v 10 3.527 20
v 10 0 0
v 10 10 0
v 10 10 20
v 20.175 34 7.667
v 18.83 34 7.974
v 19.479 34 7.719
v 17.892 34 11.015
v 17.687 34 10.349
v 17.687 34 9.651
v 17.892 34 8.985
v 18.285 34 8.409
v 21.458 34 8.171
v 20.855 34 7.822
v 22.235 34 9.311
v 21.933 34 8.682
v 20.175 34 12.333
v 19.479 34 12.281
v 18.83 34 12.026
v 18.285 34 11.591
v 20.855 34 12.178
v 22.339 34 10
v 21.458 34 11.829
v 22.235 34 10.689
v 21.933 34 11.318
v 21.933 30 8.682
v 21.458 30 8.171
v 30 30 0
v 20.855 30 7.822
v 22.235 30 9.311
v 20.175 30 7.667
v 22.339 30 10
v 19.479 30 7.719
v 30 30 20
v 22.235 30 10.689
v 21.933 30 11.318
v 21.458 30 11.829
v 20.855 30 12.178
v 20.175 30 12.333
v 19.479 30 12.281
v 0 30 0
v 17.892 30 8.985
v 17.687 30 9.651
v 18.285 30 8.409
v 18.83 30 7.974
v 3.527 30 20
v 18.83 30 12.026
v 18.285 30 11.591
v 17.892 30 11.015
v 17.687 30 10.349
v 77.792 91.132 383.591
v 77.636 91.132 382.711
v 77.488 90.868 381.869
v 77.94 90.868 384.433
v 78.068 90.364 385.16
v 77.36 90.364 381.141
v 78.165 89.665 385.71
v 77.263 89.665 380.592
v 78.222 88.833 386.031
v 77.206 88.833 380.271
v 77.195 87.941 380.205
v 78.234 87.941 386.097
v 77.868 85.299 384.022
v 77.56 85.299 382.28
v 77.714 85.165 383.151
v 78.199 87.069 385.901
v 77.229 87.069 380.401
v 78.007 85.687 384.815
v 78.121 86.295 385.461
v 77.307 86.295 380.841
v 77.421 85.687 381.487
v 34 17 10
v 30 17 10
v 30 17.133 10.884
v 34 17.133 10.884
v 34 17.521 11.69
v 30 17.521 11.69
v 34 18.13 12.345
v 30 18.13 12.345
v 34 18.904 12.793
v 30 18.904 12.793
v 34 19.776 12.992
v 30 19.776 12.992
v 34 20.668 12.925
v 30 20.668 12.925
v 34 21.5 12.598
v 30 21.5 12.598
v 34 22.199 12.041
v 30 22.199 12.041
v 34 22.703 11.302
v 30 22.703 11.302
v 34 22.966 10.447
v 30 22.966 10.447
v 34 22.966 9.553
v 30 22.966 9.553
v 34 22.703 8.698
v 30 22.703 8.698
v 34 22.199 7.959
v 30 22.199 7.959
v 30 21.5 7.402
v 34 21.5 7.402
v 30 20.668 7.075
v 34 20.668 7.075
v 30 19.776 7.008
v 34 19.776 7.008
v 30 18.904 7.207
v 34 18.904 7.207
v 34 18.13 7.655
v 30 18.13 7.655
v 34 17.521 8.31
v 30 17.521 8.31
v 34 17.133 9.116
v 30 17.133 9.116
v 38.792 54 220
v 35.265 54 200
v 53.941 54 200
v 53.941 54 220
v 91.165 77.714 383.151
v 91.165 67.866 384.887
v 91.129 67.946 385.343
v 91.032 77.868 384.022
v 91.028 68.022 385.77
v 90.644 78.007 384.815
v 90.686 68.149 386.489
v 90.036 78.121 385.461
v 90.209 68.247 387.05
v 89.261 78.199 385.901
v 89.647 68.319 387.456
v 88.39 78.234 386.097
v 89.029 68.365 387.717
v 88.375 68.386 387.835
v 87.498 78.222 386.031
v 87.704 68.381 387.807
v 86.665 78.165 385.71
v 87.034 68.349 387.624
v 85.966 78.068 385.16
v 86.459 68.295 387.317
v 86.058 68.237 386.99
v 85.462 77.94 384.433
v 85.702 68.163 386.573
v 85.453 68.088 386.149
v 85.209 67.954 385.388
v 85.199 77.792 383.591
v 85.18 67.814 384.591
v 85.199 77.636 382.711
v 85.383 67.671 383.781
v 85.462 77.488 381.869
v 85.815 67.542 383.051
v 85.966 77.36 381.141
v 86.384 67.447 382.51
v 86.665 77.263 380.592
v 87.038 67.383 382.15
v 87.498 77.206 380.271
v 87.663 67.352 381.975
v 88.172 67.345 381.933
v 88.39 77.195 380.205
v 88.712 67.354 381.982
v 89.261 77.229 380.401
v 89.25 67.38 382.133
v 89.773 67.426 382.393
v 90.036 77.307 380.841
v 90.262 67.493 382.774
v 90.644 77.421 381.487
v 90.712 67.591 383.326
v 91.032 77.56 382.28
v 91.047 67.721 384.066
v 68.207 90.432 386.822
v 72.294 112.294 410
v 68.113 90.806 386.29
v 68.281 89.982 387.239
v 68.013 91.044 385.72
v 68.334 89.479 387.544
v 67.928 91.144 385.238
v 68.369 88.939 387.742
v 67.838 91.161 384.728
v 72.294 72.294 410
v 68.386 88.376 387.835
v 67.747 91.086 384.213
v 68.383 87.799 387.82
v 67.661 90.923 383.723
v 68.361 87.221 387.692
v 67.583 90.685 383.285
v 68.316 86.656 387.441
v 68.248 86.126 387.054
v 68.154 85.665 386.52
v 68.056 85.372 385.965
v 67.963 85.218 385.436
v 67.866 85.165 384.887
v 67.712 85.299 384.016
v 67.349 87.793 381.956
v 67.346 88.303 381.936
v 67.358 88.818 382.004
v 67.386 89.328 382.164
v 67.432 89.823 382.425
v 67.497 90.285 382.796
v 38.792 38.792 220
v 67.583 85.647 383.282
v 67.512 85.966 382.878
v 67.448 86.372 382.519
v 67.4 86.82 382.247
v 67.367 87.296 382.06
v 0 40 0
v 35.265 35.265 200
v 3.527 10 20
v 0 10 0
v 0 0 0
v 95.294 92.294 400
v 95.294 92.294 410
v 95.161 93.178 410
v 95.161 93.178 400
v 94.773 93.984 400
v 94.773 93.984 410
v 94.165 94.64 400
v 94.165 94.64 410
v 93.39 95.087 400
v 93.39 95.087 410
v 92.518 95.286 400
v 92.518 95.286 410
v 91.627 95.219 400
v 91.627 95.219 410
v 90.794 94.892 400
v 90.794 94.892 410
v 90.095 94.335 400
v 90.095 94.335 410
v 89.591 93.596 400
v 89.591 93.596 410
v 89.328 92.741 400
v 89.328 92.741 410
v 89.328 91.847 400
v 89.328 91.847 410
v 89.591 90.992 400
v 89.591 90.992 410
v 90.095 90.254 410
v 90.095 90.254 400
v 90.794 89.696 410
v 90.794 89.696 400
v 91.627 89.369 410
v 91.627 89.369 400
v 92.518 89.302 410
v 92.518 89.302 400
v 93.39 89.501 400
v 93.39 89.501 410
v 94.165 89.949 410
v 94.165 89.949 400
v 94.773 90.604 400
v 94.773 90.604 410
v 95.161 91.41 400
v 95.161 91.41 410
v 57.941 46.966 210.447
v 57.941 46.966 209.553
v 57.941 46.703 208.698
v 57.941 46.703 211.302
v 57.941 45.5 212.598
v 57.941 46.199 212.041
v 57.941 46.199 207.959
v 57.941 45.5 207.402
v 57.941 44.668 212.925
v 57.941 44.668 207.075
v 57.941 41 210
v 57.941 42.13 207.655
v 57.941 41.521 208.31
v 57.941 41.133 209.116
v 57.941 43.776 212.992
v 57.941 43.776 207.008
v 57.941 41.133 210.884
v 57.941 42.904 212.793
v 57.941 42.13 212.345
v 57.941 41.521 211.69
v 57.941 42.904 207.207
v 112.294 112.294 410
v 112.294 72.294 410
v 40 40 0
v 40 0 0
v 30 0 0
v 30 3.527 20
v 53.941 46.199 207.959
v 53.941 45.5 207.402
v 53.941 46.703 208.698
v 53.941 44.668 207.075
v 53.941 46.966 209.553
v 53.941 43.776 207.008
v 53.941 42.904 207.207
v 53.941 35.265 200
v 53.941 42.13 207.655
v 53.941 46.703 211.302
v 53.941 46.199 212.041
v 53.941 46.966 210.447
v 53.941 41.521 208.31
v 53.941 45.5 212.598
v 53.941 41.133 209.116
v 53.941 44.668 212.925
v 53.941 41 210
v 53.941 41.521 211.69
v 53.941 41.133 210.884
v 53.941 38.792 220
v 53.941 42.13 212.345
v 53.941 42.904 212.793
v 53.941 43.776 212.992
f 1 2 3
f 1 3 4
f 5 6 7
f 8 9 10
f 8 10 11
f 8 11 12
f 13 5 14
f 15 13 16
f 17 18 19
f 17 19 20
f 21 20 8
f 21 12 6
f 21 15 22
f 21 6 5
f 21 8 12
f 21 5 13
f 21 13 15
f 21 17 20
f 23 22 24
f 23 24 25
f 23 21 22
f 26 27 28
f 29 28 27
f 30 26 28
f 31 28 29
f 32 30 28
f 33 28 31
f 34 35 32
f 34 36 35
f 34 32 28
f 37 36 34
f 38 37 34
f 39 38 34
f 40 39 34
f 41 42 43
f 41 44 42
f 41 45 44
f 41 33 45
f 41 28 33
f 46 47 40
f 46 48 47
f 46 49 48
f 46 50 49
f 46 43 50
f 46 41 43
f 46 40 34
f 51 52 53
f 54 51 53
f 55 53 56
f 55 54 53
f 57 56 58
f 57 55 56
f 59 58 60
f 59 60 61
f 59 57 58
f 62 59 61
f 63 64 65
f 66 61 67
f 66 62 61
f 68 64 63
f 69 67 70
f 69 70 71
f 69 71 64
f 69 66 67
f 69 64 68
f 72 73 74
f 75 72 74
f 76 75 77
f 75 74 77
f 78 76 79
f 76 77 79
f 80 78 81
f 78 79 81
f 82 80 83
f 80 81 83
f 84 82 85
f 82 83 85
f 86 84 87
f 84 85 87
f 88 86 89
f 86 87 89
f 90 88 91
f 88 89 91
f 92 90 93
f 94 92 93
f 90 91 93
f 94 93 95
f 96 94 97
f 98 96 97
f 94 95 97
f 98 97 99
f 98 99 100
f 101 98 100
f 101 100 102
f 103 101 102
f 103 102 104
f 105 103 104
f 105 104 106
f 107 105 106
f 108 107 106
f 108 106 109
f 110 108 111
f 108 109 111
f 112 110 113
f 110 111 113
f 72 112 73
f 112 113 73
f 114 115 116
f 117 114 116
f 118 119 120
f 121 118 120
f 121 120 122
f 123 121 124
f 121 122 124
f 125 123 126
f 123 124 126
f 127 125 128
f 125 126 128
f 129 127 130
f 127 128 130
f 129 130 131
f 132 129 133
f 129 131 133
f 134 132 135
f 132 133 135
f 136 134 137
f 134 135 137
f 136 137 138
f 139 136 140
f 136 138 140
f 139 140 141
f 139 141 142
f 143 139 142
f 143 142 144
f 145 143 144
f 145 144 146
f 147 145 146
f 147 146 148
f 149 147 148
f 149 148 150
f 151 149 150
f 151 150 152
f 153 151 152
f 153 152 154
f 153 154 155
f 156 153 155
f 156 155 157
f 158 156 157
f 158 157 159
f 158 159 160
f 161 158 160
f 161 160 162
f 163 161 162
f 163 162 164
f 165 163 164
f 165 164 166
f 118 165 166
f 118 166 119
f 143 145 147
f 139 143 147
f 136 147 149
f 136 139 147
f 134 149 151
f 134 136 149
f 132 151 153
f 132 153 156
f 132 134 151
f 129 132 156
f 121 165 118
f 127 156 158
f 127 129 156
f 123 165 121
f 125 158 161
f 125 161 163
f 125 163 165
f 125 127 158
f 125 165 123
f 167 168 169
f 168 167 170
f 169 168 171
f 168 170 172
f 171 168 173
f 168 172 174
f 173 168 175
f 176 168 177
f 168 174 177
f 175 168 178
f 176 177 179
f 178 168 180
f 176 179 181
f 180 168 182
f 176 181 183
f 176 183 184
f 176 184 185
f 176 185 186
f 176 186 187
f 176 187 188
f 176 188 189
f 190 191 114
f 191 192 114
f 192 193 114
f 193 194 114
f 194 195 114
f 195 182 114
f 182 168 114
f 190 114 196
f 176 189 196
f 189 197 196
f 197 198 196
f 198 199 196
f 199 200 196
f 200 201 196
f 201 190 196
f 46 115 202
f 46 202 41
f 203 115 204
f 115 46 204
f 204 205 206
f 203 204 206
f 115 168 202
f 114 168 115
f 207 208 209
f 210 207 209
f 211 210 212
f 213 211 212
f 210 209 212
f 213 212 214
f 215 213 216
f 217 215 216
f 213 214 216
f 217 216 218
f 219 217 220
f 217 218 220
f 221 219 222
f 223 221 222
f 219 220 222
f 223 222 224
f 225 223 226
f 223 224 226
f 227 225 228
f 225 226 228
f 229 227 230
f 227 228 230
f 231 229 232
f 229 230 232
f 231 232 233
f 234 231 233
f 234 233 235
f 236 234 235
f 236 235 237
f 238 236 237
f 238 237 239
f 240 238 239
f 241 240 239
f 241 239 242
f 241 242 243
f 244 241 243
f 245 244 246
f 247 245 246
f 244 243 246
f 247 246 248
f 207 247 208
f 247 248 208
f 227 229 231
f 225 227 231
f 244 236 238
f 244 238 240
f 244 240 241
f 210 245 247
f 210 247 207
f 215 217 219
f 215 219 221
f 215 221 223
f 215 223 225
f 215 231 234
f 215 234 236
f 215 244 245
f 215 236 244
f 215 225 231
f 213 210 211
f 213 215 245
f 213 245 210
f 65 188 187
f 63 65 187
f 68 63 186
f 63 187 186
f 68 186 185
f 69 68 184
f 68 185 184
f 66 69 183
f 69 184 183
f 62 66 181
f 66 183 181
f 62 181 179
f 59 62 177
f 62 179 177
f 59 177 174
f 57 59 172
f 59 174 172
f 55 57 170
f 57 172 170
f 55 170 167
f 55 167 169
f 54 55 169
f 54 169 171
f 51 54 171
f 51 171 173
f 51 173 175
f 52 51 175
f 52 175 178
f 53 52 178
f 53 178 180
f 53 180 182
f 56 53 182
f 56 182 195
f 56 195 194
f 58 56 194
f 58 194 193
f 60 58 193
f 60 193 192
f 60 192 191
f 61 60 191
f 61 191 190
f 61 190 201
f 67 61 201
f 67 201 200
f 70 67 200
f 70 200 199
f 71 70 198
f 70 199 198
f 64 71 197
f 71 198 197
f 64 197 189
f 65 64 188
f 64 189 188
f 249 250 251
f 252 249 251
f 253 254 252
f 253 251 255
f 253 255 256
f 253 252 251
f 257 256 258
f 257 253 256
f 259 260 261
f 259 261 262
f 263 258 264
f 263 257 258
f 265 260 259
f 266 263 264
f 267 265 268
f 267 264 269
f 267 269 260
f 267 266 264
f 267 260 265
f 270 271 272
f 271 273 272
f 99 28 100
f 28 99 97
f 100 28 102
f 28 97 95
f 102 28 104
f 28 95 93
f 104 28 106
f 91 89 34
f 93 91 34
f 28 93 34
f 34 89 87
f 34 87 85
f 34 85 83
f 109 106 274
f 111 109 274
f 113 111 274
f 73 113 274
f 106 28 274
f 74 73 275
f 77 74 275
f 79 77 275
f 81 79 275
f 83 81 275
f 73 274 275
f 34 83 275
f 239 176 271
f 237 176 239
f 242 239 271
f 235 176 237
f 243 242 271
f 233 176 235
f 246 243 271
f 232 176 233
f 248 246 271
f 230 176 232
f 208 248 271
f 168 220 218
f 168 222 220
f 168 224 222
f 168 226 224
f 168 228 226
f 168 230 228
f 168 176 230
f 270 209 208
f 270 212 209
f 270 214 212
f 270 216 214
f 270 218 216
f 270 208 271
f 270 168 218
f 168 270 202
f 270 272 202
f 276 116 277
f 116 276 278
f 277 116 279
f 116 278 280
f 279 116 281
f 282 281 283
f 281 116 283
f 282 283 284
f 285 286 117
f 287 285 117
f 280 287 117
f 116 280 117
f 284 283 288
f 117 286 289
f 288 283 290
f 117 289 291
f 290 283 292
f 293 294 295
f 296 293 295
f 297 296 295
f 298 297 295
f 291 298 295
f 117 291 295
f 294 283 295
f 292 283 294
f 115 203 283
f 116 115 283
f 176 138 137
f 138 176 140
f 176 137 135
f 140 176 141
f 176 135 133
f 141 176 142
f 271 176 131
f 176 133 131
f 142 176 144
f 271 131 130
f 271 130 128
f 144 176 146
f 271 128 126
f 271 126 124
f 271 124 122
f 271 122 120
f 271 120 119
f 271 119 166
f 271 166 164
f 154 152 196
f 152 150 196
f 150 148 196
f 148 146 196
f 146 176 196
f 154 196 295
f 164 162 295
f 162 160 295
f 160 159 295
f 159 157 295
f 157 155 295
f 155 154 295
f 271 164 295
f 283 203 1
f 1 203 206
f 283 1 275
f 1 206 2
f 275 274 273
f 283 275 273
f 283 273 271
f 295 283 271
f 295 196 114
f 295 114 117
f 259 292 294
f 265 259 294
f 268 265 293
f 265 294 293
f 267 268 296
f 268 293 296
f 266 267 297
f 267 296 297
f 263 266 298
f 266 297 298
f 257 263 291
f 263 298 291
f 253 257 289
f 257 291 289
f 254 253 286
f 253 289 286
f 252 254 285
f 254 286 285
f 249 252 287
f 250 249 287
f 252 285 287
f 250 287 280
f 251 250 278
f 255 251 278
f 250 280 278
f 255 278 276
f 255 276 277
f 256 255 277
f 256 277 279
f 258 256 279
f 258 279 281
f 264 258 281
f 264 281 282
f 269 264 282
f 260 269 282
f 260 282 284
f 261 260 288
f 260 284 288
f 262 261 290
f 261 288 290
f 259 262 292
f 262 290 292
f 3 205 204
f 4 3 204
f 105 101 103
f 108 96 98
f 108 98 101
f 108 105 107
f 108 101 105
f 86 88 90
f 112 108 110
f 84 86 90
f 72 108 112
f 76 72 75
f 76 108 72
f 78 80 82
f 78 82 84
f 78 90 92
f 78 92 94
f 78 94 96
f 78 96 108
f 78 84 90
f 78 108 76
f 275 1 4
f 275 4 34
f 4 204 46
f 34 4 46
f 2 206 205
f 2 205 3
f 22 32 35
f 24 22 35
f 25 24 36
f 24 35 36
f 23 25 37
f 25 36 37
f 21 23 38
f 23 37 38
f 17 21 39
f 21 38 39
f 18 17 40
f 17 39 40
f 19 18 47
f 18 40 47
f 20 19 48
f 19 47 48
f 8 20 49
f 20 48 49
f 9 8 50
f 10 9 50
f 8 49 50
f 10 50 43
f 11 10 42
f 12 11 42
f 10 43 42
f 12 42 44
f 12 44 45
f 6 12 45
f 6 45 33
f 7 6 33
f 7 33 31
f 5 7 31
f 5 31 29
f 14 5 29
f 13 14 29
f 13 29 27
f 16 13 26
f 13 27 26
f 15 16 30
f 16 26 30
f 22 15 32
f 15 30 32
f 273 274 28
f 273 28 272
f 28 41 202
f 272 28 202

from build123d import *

# Parameters (mm, degrees)
F2_W      = 40
F2_H      = 40
F0_W      = 40
F0_H      = 40
F4_W      = 20
F4_H      = 20
F5_DEPTH  = 30
F6_W      = 20
F6_H      = 20
F7_DEPTH  = 30
F8_R      = 3
F9_DEPTH  = 10
F10_R     = 3
F11_DEPTH = 10
F12_R     = 3
F13_DEPTH = 4
F14_R     = 2.339203
F15_DEPTH = 4
F16_W     = 19
F16_H     = 20
F17_DEPTH = 54
F18_R     = 3
F19_DEPTH = 4
F20_R     = 3
F21_DEPTH = 10


with BuildPart() as f3:
    # F2 (on offset) → F3 section 0
    with BuildSketch(Plane.XY.offset(410)):
        with Locations((92.29407, 92.29407)):
            Rectangle(F2_W, F2_H)
    # F0 (on Top) → F3 section 1
    with BuildSketch(Plane.XY):
        with Locations((20, 20)):
            Rectangle(F0_W, F0_H)
    loft()

    # F4 (on Right) → F5 (cut)
    with BuildSketch(Plane.YZ):
        with Locations((20, 10)):
            Rectangle(F4_W, F4_H)
    extrude(amount=F5_DEPTH, mode=Mode.SUBTRACT)

    # F6 (on Front) → F7 (cut)
    with BuildSketch(Plane.XZ):
        with Locations((20, 10)):
            Rectangle(F6_W, F6_H)
    extrude(amount=-F7_DEPTH, mode=Mode.SUBTRACT)

    # F8 (on face) → F9 (cut)
    with BuildSketch(Plane(origin=(0, 0, 0), x_dir=(1, 0, 0), z_dir=(0, -0.984808, 0.173648))):
        with Locations((88.165338, 390.824912)):
            Circle(F8_R)
    extrude(amount=-F9_DEPTH, mode=Mode.SUBTRACT)

    # F10 (on face) → F11 (cut)
    with BuildSketch(Plane(origin=(0, 0, 0), x_dir=(0, -1, 0), z_dir=(-0.984808, 0, 0.173648))):
        with Locations((-88.165338, 390.824912)):
            Circle(F10_R)
    extrude(amount=-F11_DEPTH, mode=Mode.SUBTRACT)

    # F12 (on face) → F13 (cut)
    with BuildSketch(Plane(origin=(30, 0, 0), x_dir=(0, -1, 0), z_dir=(-1, 0, 0))):
        with Locations((-20, 10)):
            Circle(F12_R)
    extrude(amount=-F13_DEPTH, mode=Mode.SUBTRACT)

    # F14 (on face) → F15 (cut)
    with BuildSketch(Plane.XZ.offset(-30)):
        with Locations((20, 10)):
            Circle(F14_R)
    extrude(amount=-F15_DEPTH, mode=Mode.SUBTRACT)

    # F16 (on Front) → F17 (cut)
    with BuildSketch(Plane.XZ):
        with Locations((44.441441, 210)):
            Rectangle(F16_W, F16_H)
    extrude(amount=-F17_DEPTH, mode=Mode.SUBTRACT)

    # F18 (on face) → F19 (cut)
    with BuildSketch(Plane(origin=(53.941441, 0, 0), x_dir=(0, -1, 0), z_dir=(-1, 0, 0))):
        with Locations((-44, 210)):
            Circle(F18_R)
    extrude(amount=-F19_DEPTH, mode=Mode.SUBTRACT)

    # F20 (on face) → F21 (cut)
    with BuildSketch(Plane.XY.offset(410)):
        with Locations((92.29407, 92.29407)):
            Circle(F20_R)
    extrude(amount=-F21_DEPTH, mode=Mode.SUBTRACT)


solid = f3.part
